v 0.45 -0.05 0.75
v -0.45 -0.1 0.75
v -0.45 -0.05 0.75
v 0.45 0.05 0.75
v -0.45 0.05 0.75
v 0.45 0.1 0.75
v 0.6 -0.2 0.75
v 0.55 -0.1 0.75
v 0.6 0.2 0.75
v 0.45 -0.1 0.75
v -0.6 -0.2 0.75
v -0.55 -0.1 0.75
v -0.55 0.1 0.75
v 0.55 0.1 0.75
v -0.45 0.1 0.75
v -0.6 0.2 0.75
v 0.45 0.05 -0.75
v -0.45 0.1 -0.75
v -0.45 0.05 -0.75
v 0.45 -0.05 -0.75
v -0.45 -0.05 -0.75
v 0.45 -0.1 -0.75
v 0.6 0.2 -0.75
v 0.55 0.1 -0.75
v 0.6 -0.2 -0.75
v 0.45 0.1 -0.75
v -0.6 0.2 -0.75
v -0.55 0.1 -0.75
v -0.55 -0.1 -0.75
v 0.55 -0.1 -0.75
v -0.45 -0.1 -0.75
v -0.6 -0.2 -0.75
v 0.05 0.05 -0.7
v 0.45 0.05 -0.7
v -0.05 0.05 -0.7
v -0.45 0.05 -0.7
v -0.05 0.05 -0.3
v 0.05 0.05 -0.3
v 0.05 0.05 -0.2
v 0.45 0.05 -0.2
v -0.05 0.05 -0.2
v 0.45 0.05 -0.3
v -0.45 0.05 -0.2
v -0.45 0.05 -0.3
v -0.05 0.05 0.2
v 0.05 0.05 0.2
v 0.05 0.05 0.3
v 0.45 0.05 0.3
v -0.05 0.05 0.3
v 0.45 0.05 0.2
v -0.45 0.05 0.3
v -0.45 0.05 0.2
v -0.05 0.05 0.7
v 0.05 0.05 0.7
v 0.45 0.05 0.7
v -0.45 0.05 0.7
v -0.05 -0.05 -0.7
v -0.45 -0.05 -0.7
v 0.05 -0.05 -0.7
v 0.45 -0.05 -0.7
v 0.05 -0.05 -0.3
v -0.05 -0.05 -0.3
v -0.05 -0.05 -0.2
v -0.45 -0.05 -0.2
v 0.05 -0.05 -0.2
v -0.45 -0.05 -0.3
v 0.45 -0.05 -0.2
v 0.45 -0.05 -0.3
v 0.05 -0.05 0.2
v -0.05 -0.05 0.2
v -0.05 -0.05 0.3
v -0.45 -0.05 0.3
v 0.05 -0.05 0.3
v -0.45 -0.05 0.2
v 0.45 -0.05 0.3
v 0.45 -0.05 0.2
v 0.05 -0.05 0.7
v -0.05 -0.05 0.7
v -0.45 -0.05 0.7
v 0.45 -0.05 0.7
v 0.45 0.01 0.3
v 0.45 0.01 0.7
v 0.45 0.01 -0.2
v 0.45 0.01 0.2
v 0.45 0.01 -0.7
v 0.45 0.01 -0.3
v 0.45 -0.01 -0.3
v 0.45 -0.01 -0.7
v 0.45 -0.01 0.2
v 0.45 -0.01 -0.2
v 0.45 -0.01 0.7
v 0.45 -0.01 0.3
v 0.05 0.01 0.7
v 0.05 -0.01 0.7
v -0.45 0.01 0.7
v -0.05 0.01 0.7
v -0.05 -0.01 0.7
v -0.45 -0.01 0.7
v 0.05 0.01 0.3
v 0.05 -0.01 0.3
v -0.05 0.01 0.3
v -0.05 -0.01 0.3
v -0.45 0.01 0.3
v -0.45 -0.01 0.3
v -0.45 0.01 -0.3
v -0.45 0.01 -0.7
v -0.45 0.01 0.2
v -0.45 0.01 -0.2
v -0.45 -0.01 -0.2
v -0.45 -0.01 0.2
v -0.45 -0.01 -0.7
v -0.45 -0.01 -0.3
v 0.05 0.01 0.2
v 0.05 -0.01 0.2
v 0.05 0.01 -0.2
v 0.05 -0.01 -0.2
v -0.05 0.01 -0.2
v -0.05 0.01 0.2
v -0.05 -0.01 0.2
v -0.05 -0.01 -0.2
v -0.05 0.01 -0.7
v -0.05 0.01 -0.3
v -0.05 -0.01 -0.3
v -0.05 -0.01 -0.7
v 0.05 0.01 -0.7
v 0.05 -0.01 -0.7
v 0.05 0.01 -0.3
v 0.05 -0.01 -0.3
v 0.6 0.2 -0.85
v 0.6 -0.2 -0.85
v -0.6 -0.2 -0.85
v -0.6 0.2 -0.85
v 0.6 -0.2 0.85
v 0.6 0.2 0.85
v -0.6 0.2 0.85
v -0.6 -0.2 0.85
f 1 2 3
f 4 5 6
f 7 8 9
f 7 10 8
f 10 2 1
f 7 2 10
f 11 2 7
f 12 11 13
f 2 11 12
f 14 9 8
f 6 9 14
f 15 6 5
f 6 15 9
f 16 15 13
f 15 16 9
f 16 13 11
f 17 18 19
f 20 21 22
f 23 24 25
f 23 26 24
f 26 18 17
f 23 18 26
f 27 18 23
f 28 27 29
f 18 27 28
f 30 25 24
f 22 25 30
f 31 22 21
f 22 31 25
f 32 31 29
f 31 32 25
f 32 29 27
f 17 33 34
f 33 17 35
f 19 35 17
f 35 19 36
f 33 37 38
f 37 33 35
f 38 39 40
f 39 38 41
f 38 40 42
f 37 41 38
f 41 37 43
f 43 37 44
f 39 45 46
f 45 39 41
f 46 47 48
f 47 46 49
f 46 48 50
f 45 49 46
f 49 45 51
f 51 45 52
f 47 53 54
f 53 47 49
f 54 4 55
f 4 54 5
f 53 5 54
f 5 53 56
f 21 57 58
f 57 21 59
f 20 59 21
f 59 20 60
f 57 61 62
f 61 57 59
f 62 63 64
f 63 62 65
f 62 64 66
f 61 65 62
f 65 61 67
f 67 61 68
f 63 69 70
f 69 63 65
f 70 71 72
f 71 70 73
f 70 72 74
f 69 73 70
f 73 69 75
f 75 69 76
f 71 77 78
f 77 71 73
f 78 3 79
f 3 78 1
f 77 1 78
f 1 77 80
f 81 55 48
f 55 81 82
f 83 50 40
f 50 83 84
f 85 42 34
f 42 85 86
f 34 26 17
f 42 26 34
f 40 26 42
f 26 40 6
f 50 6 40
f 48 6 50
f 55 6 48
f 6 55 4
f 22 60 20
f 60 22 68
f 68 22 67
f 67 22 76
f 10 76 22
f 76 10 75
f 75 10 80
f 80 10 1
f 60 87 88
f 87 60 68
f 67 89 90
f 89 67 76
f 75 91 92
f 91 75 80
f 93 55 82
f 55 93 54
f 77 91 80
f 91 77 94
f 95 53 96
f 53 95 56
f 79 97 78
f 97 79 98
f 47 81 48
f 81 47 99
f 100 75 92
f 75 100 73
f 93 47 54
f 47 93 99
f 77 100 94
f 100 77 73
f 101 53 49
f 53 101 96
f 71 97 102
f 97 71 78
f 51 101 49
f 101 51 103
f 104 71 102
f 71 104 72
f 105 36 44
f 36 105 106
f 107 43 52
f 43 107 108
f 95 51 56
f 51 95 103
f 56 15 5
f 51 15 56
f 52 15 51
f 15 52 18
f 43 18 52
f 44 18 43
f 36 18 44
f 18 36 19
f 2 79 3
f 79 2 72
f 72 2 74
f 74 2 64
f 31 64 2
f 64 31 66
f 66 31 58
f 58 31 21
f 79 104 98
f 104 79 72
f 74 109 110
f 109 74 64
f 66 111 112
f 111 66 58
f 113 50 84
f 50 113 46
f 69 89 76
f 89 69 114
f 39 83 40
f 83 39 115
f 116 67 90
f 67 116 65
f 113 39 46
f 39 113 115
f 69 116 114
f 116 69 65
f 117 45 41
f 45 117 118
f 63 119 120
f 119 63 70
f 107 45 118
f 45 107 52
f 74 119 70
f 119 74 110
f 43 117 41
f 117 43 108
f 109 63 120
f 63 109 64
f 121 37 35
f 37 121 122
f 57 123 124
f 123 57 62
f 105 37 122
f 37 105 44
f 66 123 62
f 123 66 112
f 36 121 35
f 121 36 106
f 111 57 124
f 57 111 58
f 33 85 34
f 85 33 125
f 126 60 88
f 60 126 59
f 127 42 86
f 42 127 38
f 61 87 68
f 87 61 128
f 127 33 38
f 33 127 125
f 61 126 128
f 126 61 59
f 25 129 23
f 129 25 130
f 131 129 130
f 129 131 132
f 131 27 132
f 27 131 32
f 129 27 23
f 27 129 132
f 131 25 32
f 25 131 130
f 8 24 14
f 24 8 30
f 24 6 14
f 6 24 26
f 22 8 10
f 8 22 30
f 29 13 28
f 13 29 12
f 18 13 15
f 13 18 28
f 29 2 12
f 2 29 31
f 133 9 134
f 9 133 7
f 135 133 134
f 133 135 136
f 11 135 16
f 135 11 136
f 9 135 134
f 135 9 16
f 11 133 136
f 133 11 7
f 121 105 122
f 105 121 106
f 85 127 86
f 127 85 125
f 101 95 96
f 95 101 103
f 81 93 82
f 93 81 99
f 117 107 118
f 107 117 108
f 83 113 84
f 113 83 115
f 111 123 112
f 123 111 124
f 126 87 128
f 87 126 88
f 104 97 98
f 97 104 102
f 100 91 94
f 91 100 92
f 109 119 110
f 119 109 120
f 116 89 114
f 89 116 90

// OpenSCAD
module Window_01(){  
    color("#A1662F"){
    difference(){

        cube([1,0.1,1.5],center = true);

        translate([0.25,0,0.5])
        cube([0.4,0.2,0.4],center = true);

        translate([-0.25,0,0.5])
        cube([0.4,0.2,0.4],center = true);

        translate([0.25,0,0])
        cube([0.4,0.2,0.4],center = true);

        translate([-0.25,0,0])
        cube([0.4,0.2,0.4],center = true);

        translate([-0.25,0,-0.5])
        cube([0.4,0.2,0.4],center = true);

        translate([0.25,0,-0.5])
        cube([0.4,0.2,0.4],center = true);

    }

    translate([0,0,-0.8])
    cube([1.2,0.4,0.1],center = true);

    translate([0.5,0,-0])
    cube([0.1,0.2,1.5],center = true);

    translate([-0.5,0,-0])
    cube([0.1,0.2,1.5],center = true);

    translate([-0,0,0.8])
    cube([1.2,0.4,0.1],center = true);
    
    }
    color("#a7c7cb"){
    cube([1,0.02,1.4],center = true);
    }
}


Window_01();

// Written by Nicolì Angelo (Gengio) 2024: 
// MIT License

//Permission is hereby granted, free of charge, to any person obtaining a copy of this software and associated documentation files (the "Software"), to deal in the Software without restriction, including without limitation the rights to use, copy, modify, merge, publish, distribute, sublicense, and/or sell copies of the Software, and to permit persons to whom the Software is furnished to do so, subject to the following conditions:

//The above copyright notice and this permission notice shall be included in all copies or substantial portions of the Software.

//THE SOFTWARE IS PROVIDED "AS IS", WITHOUT WARRANTY OF ANY KIND, EXPRESS OR IMPLIED, INCLUDING BUT NOT LIMITED TO THE WARRANTIES OF MERCHANTABILITY, FITNESS FOR A PARTICULAR PURPOSE AND NONINFRINGEMENT. IN NO EVENT SHALL THE AUTHORS OR COPYRIGHT HOLDERS BE LIABLE FOR ANY CLAIM, DAMAGES OR OTHER LIABILITY, WHETHER IN AN ACTION OF CONTRACT, TORT OR OTHERWISE, ARISING FROM, OUT OF OR IN CONNECTION WITH THE SOFTWARE OR THE USE OR OTHER DEALINGS IN THE SOFTWARE.
